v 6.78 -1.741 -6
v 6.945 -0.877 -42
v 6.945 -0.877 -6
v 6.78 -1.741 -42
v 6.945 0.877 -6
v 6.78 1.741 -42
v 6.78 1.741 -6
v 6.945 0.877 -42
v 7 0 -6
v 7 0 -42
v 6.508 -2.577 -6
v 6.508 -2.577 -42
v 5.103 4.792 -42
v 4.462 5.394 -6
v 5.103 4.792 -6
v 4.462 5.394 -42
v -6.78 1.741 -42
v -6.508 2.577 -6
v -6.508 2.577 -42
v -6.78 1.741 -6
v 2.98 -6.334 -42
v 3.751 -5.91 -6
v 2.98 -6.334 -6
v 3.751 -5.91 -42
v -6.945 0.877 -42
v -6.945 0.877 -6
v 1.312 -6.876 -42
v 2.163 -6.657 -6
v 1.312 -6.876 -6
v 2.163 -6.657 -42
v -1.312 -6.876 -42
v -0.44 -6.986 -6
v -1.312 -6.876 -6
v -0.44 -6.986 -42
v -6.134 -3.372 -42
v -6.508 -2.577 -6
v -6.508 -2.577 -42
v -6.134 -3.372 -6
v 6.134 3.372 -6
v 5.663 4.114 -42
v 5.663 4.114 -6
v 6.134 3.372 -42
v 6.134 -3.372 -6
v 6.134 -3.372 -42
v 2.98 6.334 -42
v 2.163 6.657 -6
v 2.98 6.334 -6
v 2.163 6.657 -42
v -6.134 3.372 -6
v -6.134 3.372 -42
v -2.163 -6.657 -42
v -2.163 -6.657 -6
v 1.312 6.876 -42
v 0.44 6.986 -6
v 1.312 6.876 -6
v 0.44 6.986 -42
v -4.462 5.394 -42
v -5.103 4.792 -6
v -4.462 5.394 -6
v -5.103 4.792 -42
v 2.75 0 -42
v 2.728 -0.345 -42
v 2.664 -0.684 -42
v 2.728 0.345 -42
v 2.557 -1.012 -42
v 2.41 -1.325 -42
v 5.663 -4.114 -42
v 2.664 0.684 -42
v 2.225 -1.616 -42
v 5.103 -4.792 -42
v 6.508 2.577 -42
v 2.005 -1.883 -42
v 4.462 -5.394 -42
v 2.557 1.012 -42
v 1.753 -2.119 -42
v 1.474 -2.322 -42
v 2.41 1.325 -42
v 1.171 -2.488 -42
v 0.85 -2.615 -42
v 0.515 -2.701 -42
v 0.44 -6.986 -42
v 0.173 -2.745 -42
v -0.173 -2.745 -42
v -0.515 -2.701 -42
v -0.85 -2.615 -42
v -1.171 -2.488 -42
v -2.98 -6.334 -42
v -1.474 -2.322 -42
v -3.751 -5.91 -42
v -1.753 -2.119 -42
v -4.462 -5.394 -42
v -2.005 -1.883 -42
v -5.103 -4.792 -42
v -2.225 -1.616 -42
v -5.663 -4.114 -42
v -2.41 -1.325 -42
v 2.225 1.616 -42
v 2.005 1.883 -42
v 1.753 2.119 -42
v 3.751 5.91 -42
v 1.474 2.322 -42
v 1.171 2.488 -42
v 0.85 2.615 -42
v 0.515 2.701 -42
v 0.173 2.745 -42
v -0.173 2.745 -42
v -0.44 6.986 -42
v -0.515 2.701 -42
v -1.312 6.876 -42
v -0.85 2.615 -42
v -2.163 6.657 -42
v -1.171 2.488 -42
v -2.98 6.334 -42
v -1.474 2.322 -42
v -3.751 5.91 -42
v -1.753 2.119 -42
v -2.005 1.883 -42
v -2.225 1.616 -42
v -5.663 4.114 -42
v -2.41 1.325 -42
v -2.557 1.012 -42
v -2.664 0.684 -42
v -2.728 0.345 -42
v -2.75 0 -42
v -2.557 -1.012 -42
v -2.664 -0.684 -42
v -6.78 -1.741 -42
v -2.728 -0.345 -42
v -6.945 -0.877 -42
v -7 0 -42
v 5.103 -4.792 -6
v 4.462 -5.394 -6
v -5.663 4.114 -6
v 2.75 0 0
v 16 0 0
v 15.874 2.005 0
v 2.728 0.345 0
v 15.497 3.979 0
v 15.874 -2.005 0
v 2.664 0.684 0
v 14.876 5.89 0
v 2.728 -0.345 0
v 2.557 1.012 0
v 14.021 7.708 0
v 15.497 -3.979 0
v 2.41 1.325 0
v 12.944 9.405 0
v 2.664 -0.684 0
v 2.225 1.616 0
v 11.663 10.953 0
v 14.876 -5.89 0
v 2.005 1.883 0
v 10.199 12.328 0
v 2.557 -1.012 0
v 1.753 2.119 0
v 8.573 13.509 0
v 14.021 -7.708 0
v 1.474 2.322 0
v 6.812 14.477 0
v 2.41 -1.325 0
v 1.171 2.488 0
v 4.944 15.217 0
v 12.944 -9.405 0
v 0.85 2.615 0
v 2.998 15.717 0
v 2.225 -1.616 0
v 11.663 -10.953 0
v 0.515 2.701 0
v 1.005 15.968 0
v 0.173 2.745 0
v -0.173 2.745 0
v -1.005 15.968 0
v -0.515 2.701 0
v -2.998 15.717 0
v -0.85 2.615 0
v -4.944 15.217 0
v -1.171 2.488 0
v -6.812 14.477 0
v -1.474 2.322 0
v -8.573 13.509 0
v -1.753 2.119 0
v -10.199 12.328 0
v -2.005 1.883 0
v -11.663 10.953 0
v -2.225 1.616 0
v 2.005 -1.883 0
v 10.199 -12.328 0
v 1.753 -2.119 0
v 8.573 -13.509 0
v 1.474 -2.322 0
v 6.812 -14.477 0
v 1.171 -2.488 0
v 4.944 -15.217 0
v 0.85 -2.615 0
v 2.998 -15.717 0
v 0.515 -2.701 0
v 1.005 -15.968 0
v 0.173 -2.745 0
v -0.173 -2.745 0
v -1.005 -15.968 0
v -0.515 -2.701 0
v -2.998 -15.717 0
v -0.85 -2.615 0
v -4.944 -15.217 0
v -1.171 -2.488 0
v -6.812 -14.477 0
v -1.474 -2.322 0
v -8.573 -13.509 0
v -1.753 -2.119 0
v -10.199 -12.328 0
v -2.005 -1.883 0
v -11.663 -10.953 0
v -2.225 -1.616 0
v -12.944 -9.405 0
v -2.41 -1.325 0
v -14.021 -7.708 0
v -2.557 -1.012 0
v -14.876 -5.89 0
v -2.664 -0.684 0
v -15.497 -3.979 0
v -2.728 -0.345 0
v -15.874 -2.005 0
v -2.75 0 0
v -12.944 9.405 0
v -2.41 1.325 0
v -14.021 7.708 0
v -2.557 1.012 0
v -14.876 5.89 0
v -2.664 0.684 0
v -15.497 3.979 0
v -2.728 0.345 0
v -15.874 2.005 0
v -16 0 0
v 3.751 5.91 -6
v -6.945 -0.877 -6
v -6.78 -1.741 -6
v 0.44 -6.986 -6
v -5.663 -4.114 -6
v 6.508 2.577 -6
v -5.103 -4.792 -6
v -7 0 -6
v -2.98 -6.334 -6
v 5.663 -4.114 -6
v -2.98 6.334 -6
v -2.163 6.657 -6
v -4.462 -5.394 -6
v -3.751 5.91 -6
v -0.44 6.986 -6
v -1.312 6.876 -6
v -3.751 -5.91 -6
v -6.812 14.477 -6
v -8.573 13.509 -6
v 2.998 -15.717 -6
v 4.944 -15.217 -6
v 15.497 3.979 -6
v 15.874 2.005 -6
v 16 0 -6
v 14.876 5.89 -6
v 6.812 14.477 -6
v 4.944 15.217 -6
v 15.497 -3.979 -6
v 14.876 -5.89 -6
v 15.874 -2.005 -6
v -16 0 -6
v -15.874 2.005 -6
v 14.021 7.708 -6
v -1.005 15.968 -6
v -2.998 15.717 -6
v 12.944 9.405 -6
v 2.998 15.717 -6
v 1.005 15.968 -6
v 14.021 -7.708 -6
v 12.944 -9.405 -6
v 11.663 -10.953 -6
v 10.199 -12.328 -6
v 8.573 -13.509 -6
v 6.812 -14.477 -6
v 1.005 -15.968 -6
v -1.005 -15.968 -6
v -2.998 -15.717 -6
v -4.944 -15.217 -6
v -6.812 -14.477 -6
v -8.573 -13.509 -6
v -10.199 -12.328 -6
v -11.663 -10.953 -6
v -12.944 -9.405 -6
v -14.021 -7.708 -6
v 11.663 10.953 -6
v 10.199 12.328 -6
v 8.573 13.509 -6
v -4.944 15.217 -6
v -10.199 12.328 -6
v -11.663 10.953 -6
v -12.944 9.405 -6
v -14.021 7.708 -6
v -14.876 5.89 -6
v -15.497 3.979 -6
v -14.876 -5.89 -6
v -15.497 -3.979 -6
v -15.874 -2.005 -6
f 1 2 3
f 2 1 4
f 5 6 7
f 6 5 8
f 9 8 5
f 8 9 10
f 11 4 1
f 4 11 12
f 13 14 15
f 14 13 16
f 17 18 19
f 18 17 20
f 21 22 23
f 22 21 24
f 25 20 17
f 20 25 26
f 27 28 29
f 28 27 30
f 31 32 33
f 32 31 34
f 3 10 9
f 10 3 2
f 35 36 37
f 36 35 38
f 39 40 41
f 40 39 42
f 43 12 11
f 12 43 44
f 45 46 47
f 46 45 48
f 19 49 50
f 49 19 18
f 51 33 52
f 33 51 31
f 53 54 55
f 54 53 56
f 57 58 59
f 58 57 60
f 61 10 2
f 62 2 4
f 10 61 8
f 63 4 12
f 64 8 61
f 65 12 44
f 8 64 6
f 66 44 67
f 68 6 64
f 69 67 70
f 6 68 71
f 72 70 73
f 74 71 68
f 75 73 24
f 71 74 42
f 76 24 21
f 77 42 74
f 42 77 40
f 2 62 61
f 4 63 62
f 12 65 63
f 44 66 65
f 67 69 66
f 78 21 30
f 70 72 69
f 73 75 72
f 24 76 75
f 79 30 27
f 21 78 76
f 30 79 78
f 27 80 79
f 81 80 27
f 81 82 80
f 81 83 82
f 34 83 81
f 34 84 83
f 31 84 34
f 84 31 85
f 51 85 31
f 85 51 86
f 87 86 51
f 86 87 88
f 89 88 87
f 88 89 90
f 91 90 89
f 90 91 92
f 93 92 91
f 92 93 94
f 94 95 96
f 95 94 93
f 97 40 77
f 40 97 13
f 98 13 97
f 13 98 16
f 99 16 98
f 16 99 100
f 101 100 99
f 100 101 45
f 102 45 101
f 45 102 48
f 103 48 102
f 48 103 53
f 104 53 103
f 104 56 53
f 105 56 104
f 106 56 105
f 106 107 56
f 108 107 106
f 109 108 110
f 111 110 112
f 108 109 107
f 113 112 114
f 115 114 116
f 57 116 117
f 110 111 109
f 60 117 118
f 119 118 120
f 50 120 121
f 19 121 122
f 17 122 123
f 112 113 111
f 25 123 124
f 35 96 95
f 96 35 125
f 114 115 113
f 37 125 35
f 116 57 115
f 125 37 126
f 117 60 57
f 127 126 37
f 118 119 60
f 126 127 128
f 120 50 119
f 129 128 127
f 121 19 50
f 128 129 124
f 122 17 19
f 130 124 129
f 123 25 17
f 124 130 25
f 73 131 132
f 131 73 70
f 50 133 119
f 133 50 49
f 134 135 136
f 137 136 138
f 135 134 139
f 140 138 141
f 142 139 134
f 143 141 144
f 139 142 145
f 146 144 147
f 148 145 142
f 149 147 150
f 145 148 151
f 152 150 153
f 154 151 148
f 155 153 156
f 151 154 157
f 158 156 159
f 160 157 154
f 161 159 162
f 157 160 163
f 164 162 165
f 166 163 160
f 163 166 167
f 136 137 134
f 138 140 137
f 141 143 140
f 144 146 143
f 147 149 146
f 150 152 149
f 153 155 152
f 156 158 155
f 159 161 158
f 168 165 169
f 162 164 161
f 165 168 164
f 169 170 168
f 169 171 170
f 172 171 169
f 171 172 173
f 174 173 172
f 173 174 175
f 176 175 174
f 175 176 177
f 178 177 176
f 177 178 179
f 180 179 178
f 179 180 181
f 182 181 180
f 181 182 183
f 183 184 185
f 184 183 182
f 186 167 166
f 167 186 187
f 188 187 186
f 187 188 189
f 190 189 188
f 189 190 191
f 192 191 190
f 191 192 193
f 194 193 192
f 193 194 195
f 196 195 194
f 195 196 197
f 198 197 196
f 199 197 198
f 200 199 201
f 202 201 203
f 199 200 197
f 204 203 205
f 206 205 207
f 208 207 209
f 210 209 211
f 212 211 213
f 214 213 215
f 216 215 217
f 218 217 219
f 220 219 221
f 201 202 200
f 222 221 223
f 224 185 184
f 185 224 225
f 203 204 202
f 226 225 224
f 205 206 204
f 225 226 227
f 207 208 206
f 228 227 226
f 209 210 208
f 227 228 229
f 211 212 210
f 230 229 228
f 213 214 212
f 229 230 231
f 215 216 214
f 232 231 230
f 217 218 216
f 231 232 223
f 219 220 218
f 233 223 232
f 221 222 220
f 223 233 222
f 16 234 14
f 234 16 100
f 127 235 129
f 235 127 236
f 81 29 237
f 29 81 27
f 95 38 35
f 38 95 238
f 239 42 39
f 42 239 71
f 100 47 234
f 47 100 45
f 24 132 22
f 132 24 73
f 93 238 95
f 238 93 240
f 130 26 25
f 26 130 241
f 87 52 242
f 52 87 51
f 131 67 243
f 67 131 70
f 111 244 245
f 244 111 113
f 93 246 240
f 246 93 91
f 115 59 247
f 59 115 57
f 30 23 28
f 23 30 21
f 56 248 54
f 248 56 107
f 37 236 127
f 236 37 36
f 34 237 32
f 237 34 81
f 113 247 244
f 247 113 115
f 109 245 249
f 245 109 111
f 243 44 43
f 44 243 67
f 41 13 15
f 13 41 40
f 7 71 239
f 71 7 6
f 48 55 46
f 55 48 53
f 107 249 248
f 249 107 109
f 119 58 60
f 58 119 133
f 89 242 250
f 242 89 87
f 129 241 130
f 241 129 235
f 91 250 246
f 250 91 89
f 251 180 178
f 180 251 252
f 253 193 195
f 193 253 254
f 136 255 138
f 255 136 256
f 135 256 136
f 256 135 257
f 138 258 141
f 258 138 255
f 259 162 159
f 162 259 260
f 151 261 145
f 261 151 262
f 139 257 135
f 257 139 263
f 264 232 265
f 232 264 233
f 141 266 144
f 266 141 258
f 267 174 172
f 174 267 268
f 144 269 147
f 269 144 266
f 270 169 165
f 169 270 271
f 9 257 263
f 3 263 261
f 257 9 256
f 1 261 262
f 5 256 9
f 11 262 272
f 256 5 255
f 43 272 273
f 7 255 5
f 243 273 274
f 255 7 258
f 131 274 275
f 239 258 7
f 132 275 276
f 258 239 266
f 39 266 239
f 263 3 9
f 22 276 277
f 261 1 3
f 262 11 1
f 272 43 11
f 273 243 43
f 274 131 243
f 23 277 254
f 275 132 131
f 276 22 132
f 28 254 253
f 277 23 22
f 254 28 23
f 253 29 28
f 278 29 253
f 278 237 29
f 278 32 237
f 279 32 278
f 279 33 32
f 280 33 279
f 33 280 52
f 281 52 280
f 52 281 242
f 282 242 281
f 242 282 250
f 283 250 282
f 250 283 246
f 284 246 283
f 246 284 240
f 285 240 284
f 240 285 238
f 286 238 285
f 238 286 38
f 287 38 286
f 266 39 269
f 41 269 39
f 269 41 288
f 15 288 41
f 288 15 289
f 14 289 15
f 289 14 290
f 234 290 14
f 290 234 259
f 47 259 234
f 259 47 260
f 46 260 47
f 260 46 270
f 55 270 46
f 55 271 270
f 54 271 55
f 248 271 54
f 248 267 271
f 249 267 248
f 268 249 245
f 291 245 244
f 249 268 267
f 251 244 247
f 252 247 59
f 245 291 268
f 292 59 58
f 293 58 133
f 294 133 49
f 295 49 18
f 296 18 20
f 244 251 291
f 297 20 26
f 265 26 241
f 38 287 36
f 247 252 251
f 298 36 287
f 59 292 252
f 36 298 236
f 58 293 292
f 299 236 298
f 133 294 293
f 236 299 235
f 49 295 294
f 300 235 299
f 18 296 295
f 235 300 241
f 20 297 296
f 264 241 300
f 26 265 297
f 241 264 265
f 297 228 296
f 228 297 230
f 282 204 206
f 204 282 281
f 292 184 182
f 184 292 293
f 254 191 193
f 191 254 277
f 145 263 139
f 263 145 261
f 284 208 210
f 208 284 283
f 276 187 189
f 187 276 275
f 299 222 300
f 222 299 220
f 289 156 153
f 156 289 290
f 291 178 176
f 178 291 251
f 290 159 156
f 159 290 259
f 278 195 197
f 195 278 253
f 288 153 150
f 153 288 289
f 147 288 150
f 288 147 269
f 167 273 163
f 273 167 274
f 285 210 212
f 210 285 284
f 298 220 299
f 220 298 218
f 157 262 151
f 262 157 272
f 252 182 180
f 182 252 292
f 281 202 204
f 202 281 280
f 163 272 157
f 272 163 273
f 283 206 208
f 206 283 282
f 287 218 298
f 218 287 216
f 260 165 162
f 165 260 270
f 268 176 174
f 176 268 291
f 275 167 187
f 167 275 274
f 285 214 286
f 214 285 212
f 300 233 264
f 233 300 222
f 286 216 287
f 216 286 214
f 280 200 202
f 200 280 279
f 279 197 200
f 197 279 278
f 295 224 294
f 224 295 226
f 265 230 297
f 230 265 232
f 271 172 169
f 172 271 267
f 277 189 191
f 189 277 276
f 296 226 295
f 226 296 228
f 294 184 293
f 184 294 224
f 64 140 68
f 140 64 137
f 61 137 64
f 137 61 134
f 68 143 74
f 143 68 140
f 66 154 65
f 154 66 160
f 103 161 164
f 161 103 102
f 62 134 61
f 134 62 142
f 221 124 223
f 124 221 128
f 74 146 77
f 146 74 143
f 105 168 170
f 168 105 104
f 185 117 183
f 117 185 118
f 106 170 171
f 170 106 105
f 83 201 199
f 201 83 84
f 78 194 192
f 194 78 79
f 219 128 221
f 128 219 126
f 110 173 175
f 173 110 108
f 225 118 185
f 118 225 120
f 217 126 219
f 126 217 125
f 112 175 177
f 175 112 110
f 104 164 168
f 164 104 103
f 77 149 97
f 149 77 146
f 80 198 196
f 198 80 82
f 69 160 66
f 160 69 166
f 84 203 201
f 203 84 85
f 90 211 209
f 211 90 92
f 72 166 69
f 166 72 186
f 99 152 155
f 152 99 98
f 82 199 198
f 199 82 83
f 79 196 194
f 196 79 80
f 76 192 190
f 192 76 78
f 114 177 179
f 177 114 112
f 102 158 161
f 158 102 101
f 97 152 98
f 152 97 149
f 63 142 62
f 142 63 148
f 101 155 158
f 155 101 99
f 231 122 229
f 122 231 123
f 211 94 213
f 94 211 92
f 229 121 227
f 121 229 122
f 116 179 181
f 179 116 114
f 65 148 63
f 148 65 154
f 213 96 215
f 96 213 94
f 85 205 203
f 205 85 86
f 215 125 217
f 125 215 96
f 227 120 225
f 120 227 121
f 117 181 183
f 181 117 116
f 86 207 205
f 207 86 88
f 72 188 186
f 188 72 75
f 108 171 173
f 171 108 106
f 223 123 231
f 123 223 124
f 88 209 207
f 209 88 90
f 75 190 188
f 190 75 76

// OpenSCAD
$fn = 50;


difference() {
	union() {
		translate(v = [0, 0, -42.0000000000]) {
			cylinder(h = 42, r = 7.0000000000);
		}
		translate(v = [0, 0, -6.0000000000]) {
			cylinder(h = 6, r = 16.0000000000);
		}
	}
	union() {
		#translate(v = [0, 0, -42]) {
			cylinder(h = 42, r = 2.7500000000);
		}
	}
}
